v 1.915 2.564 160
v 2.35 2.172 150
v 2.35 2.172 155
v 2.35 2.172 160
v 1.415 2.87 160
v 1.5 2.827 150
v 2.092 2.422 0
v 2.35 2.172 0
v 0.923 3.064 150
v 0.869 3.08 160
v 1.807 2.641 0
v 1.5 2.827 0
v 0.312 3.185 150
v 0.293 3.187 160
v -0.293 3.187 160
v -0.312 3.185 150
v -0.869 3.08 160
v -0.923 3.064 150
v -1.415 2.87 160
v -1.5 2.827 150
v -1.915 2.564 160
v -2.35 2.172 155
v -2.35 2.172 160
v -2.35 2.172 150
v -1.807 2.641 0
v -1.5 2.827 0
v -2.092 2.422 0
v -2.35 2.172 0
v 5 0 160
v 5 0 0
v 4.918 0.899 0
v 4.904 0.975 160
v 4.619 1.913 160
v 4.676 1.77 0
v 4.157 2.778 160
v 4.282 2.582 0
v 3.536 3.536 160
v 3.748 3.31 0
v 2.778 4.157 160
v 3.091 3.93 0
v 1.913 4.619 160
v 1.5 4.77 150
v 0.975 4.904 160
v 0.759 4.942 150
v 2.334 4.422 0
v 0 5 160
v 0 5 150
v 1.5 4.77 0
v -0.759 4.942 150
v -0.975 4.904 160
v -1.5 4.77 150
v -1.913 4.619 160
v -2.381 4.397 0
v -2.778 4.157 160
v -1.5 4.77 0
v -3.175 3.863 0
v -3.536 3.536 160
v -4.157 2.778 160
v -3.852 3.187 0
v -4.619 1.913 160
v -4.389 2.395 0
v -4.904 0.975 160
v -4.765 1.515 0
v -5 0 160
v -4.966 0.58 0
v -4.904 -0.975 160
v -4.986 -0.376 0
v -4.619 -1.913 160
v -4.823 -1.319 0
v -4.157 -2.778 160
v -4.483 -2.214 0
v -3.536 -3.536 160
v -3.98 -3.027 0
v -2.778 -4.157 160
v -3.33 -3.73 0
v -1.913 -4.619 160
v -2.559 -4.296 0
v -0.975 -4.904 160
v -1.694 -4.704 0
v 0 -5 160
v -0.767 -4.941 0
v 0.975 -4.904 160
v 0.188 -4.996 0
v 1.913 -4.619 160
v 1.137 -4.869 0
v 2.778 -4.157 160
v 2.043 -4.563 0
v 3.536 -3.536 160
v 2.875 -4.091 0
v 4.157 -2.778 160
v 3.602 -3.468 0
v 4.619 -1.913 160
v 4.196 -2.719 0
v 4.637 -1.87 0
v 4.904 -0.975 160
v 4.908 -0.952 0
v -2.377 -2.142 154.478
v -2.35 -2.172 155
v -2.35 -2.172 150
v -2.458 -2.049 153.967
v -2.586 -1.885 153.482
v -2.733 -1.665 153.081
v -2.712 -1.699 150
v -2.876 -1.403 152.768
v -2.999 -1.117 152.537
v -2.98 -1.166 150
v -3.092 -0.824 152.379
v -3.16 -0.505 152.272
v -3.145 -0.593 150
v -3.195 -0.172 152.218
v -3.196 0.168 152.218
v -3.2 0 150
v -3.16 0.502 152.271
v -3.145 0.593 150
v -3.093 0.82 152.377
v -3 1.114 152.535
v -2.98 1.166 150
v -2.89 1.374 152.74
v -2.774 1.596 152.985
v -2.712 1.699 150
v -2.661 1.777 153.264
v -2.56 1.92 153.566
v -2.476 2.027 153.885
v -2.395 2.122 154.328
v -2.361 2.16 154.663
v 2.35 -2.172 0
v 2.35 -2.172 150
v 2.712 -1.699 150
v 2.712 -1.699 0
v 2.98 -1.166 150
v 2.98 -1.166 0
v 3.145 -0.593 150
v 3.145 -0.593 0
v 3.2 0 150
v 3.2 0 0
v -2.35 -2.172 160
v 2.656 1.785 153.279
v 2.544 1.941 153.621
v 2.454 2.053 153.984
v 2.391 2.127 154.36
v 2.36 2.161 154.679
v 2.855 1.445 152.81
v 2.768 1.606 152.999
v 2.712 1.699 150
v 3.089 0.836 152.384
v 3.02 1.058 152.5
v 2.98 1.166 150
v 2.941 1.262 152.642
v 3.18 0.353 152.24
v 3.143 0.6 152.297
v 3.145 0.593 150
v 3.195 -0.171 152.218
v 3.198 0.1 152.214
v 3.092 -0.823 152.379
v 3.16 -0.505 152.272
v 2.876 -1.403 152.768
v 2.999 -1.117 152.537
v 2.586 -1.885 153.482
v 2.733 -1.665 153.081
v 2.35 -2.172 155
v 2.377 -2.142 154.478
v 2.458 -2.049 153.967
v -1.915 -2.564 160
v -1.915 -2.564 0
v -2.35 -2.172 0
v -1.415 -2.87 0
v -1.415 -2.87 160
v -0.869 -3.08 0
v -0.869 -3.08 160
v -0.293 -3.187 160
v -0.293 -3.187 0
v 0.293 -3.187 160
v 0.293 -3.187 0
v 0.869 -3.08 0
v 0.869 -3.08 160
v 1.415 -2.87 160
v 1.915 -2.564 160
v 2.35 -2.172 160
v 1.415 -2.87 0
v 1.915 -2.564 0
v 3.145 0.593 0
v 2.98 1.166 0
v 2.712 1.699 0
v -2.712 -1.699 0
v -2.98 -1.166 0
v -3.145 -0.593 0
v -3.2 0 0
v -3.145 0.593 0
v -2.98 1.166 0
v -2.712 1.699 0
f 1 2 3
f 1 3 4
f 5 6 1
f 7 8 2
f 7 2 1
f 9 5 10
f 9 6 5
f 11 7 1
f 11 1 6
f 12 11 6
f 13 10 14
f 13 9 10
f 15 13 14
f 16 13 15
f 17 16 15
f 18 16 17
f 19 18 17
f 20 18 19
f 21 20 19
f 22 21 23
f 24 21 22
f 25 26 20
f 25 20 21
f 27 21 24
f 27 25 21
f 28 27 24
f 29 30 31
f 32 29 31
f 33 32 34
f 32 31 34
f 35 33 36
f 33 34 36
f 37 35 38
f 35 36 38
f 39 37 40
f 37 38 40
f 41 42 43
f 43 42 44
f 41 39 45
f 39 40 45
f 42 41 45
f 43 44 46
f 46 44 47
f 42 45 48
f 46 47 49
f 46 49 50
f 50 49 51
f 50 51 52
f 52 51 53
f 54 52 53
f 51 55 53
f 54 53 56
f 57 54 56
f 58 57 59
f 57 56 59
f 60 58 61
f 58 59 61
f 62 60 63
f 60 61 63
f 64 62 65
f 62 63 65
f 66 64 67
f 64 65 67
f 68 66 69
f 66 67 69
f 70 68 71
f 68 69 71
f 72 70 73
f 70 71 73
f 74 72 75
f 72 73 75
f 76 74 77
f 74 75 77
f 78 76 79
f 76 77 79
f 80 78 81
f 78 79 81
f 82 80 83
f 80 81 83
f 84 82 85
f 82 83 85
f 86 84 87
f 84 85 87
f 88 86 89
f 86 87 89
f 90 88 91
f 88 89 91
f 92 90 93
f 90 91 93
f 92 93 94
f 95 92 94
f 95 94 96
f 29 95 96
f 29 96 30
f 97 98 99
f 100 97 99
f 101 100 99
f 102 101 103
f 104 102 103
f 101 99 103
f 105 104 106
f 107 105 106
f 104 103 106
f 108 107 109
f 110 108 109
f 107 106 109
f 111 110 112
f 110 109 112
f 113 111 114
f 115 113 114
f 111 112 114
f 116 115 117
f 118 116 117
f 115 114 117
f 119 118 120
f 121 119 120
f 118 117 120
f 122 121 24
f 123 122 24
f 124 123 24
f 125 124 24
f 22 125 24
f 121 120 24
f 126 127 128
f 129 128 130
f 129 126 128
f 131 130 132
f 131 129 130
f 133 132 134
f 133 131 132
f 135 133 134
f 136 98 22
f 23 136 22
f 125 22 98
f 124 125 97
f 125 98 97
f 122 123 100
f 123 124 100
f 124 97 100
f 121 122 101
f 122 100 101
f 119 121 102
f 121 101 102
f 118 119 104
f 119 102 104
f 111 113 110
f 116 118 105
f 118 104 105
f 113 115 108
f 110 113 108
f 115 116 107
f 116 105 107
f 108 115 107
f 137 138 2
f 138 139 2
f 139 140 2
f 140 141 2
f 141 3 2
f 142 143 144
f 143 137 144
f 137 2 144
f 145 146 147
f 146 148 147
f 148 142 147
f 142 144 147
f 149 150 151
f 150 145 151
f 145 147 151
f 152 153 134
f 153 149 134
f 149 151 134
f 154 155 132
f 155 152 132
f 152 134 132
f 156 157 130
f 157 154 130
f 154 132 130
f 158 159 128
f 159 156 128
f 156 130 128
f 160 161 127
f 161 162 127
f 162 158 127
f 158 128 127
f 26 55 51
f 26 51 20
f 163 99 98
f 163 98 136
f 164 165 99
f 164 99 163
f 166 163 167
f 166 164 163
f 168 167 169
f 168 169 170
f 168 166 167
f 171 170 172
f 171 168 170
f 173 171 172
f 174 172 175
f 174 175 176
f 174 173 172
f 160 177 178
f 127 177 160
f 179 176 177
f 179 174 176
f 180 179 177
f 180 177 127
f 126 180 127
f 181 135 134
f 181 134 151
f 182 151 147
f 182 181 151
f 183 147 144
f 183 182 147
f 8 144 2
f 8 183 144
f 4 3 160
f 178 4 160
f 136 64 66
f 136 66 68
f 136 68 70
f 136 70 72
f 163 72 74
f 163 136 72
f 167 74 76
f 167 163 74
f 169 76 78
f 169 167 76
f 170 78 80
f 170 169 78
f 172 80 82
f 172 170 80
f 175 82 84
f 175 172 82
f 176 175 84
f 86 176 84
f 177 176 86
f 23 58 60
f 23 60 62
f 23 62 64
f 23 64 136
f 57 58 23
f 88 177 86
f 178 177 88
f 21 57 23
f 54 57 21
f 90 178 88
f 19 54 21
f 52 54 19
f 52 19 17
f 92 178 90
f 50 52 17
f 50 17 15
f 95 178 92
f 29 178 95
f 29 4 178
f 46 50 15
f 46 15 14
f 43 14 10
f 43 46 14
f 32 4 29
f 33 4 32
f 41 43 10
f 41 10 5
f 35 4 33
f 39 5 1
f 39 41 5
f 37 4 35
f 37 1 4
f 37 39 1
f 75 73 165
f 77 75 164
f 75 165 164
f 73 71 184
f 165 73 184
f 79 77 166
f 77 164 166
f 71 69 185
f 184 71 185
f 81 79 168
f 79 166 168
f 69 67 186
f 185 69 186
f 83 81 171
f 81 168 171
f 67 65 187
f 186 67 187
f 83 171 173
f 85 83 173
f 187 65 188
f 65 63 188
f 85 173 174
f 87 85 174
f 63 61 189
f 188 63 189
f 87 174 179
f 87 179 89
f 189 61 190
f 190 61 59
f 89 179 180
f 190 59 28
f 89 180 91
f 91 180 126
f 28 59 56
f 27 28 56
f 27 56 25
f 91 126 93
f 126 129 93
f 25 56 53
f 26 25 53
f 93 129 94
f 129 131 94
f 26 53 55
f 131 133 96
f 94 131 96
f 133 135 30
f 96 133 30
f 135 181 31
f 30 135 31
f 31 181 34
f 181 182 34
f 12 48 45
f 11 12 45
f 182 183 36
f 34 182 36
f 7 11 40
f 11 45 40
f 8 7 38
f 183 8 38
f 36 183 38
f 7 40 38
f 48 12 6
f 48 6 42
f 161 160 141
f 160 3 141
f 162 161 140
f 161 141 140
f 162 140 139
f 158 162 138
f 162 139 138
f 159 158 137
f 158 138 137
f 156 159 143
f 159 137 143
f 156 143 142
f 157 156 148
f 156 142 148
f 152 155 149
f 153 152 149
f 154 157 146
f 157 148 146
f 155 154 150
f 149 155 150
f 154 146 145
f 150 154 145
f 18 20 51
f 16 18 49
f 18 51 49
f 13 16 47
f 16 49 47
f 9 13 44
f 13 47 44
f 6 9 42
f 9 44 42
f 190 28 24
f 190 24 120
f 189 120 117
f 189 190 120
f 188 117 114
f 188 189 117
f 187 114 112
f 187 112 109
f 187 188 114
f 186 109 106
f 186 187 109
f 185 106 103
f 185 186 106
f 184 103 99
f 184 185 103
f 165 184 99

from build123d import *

# Parameters (mm, degrees)
SKETCH1_R           = 5
SKETCH1_R_2         = 3.2
BOSS_EXTRUDE1_DEPTH = 160
CUT_EXTRUDE1_DEPTH  = 150
FILLET1_R           = 5


with BuildPart() as part:
    # Sketch1 → Boss-Extrude1 (new body)
    # profile 1 of 3: a face of its own
    with BuildSketch(Plane.XY):
        Circle(SKETCH1_R)
        Circle(SKETCH1_R_2, mode=Mode.SUBTRACT)
    # profile 2 of 3: a face of its own
    with BuildSketch(Plane.XY):
        with BuildLine():
            ThreePointArc((3.2, 0), (2.979932885, 1.166190379), (2.35, 2.171980663))
            Line((2.35, 2.171980663), (2.35, -2.171980663))
            ThreePointArc((2.35, -2.171980663), (2.979932885, -1.166190379), (3.2, 0))
        make_face()
    # profile 3 of 3: a face of its own
    with BuildSketch(Plane.XY):
        with BuildLine():
            Line((-2.35, -2.171980663), (-2.35, 2.171980663))
            ThreePointArc((-2.35, 2.171980663), (-3.2, 0), (-2.35, -2.171980663))
        make_face()
    extrude(amount=BOSS_EXTRUDE1_DEPTH)

    # Sketch2 → Cut-Extrude1 (cut)
    with BuildSketch(Plane.XY):
        with BuildLine():
            Line((1.5, 0), (1.5, -2.826658805))
            ThreePointArc((1.5, -2.826658805), (2.74226184, -1.64924225), (3.2, 0))
            ThreePointArc((3.2, 0), (2.74226184, 1.64924225), (1.5, 2.826658805))
            Line((1.5, 2.826658805), (1.5, 0))
        make_face()
        with BuildLine():
            ThreePointArc((-1.5, 2.826658805), (0, 3.2), (1.5, 2.826658805))
            Line((1.5, 2.826658805), (1.5, 5))
            Line((1.5, 5), (-1.5, 5))
            Line((-1.5, 5), (-1.5, 2.826658805))
        make_face()
        with BuildLine():
            ThreePointArc((-1.5, 2.826658805), (-3.2, 0), (-1.5, -2.826658805))
            Line((-1.5, -2.826658805), (-1.5, 0))
            Line((-1.5, 0), (-1.5, 2.826658805))
        make_face()
    extrude(amount=CUT_EXTRUDE1_DEPTH, mode=Mode.SUBTRACT)

    # Fillet1
    # the kernel refuses this fillet: 5 mm, written as the material it takes off along each edge
    with BuildSketch(Plane(origin=(2.35, 14.671980663, 150), x_dir=(0, 0, 1), z_dir=(0, -1, 0))) as fillet1_piece_1_section:
        with BuildLine():
            CenterArc((FILLET1_R, -FILLET1_R), FILLET1_R, 90, 90)
            Line((0, -FILLET1_R), (0, 0))
            Line((0, 0), (FILLET1_R, 0))
        make_face()
    fillet1_piece_1 = extrude(amount=29.343961326, mode=Mode.PRIVATE)
    fillet1_piece_1 = fillet1_piece_1 & Plane(origin=(0, 0, 151.715946683), x_dir=(1, 0, 0), z_dir=(0, 0, -1)) * Cylinder(3.2, 79, mode=Mode.PRIVATE)
    add(fillet1_piece_1, mode=Mode.SUBTRACT)
    with BuildSketch(Plane(origin=(-2.35, -14.671980663, 150), x_dir=(-1, 0, 0), z_dir=(0, 1, 0))) as fillet1_piece_2_section:
        with BuildLine():
            CenterArc((FILLET1_R, FILLET1_R), FILLET1_R, 180, 90)
            Line((0, FILLET1_R), (0, 0))
            Line((0, 0), (FILLET1_R, 0))
        make_face()
    fillet1_piece_2 = extrude(amount=29.343961326, mode=Mode.PRIVATE)
    fillet1_piece_2 = fillet1_piece_2 & Plane(origin=(0, 0, 151.715946769), x_dir=(1, 0, 0), z_dir=(0, 0, -1)) * Cylinder(3.2, 79, mode=Mode.PRIVATE)
    add(fillet1_piece_2, mode=Mode.SUBTRACT)


solid = part.part
